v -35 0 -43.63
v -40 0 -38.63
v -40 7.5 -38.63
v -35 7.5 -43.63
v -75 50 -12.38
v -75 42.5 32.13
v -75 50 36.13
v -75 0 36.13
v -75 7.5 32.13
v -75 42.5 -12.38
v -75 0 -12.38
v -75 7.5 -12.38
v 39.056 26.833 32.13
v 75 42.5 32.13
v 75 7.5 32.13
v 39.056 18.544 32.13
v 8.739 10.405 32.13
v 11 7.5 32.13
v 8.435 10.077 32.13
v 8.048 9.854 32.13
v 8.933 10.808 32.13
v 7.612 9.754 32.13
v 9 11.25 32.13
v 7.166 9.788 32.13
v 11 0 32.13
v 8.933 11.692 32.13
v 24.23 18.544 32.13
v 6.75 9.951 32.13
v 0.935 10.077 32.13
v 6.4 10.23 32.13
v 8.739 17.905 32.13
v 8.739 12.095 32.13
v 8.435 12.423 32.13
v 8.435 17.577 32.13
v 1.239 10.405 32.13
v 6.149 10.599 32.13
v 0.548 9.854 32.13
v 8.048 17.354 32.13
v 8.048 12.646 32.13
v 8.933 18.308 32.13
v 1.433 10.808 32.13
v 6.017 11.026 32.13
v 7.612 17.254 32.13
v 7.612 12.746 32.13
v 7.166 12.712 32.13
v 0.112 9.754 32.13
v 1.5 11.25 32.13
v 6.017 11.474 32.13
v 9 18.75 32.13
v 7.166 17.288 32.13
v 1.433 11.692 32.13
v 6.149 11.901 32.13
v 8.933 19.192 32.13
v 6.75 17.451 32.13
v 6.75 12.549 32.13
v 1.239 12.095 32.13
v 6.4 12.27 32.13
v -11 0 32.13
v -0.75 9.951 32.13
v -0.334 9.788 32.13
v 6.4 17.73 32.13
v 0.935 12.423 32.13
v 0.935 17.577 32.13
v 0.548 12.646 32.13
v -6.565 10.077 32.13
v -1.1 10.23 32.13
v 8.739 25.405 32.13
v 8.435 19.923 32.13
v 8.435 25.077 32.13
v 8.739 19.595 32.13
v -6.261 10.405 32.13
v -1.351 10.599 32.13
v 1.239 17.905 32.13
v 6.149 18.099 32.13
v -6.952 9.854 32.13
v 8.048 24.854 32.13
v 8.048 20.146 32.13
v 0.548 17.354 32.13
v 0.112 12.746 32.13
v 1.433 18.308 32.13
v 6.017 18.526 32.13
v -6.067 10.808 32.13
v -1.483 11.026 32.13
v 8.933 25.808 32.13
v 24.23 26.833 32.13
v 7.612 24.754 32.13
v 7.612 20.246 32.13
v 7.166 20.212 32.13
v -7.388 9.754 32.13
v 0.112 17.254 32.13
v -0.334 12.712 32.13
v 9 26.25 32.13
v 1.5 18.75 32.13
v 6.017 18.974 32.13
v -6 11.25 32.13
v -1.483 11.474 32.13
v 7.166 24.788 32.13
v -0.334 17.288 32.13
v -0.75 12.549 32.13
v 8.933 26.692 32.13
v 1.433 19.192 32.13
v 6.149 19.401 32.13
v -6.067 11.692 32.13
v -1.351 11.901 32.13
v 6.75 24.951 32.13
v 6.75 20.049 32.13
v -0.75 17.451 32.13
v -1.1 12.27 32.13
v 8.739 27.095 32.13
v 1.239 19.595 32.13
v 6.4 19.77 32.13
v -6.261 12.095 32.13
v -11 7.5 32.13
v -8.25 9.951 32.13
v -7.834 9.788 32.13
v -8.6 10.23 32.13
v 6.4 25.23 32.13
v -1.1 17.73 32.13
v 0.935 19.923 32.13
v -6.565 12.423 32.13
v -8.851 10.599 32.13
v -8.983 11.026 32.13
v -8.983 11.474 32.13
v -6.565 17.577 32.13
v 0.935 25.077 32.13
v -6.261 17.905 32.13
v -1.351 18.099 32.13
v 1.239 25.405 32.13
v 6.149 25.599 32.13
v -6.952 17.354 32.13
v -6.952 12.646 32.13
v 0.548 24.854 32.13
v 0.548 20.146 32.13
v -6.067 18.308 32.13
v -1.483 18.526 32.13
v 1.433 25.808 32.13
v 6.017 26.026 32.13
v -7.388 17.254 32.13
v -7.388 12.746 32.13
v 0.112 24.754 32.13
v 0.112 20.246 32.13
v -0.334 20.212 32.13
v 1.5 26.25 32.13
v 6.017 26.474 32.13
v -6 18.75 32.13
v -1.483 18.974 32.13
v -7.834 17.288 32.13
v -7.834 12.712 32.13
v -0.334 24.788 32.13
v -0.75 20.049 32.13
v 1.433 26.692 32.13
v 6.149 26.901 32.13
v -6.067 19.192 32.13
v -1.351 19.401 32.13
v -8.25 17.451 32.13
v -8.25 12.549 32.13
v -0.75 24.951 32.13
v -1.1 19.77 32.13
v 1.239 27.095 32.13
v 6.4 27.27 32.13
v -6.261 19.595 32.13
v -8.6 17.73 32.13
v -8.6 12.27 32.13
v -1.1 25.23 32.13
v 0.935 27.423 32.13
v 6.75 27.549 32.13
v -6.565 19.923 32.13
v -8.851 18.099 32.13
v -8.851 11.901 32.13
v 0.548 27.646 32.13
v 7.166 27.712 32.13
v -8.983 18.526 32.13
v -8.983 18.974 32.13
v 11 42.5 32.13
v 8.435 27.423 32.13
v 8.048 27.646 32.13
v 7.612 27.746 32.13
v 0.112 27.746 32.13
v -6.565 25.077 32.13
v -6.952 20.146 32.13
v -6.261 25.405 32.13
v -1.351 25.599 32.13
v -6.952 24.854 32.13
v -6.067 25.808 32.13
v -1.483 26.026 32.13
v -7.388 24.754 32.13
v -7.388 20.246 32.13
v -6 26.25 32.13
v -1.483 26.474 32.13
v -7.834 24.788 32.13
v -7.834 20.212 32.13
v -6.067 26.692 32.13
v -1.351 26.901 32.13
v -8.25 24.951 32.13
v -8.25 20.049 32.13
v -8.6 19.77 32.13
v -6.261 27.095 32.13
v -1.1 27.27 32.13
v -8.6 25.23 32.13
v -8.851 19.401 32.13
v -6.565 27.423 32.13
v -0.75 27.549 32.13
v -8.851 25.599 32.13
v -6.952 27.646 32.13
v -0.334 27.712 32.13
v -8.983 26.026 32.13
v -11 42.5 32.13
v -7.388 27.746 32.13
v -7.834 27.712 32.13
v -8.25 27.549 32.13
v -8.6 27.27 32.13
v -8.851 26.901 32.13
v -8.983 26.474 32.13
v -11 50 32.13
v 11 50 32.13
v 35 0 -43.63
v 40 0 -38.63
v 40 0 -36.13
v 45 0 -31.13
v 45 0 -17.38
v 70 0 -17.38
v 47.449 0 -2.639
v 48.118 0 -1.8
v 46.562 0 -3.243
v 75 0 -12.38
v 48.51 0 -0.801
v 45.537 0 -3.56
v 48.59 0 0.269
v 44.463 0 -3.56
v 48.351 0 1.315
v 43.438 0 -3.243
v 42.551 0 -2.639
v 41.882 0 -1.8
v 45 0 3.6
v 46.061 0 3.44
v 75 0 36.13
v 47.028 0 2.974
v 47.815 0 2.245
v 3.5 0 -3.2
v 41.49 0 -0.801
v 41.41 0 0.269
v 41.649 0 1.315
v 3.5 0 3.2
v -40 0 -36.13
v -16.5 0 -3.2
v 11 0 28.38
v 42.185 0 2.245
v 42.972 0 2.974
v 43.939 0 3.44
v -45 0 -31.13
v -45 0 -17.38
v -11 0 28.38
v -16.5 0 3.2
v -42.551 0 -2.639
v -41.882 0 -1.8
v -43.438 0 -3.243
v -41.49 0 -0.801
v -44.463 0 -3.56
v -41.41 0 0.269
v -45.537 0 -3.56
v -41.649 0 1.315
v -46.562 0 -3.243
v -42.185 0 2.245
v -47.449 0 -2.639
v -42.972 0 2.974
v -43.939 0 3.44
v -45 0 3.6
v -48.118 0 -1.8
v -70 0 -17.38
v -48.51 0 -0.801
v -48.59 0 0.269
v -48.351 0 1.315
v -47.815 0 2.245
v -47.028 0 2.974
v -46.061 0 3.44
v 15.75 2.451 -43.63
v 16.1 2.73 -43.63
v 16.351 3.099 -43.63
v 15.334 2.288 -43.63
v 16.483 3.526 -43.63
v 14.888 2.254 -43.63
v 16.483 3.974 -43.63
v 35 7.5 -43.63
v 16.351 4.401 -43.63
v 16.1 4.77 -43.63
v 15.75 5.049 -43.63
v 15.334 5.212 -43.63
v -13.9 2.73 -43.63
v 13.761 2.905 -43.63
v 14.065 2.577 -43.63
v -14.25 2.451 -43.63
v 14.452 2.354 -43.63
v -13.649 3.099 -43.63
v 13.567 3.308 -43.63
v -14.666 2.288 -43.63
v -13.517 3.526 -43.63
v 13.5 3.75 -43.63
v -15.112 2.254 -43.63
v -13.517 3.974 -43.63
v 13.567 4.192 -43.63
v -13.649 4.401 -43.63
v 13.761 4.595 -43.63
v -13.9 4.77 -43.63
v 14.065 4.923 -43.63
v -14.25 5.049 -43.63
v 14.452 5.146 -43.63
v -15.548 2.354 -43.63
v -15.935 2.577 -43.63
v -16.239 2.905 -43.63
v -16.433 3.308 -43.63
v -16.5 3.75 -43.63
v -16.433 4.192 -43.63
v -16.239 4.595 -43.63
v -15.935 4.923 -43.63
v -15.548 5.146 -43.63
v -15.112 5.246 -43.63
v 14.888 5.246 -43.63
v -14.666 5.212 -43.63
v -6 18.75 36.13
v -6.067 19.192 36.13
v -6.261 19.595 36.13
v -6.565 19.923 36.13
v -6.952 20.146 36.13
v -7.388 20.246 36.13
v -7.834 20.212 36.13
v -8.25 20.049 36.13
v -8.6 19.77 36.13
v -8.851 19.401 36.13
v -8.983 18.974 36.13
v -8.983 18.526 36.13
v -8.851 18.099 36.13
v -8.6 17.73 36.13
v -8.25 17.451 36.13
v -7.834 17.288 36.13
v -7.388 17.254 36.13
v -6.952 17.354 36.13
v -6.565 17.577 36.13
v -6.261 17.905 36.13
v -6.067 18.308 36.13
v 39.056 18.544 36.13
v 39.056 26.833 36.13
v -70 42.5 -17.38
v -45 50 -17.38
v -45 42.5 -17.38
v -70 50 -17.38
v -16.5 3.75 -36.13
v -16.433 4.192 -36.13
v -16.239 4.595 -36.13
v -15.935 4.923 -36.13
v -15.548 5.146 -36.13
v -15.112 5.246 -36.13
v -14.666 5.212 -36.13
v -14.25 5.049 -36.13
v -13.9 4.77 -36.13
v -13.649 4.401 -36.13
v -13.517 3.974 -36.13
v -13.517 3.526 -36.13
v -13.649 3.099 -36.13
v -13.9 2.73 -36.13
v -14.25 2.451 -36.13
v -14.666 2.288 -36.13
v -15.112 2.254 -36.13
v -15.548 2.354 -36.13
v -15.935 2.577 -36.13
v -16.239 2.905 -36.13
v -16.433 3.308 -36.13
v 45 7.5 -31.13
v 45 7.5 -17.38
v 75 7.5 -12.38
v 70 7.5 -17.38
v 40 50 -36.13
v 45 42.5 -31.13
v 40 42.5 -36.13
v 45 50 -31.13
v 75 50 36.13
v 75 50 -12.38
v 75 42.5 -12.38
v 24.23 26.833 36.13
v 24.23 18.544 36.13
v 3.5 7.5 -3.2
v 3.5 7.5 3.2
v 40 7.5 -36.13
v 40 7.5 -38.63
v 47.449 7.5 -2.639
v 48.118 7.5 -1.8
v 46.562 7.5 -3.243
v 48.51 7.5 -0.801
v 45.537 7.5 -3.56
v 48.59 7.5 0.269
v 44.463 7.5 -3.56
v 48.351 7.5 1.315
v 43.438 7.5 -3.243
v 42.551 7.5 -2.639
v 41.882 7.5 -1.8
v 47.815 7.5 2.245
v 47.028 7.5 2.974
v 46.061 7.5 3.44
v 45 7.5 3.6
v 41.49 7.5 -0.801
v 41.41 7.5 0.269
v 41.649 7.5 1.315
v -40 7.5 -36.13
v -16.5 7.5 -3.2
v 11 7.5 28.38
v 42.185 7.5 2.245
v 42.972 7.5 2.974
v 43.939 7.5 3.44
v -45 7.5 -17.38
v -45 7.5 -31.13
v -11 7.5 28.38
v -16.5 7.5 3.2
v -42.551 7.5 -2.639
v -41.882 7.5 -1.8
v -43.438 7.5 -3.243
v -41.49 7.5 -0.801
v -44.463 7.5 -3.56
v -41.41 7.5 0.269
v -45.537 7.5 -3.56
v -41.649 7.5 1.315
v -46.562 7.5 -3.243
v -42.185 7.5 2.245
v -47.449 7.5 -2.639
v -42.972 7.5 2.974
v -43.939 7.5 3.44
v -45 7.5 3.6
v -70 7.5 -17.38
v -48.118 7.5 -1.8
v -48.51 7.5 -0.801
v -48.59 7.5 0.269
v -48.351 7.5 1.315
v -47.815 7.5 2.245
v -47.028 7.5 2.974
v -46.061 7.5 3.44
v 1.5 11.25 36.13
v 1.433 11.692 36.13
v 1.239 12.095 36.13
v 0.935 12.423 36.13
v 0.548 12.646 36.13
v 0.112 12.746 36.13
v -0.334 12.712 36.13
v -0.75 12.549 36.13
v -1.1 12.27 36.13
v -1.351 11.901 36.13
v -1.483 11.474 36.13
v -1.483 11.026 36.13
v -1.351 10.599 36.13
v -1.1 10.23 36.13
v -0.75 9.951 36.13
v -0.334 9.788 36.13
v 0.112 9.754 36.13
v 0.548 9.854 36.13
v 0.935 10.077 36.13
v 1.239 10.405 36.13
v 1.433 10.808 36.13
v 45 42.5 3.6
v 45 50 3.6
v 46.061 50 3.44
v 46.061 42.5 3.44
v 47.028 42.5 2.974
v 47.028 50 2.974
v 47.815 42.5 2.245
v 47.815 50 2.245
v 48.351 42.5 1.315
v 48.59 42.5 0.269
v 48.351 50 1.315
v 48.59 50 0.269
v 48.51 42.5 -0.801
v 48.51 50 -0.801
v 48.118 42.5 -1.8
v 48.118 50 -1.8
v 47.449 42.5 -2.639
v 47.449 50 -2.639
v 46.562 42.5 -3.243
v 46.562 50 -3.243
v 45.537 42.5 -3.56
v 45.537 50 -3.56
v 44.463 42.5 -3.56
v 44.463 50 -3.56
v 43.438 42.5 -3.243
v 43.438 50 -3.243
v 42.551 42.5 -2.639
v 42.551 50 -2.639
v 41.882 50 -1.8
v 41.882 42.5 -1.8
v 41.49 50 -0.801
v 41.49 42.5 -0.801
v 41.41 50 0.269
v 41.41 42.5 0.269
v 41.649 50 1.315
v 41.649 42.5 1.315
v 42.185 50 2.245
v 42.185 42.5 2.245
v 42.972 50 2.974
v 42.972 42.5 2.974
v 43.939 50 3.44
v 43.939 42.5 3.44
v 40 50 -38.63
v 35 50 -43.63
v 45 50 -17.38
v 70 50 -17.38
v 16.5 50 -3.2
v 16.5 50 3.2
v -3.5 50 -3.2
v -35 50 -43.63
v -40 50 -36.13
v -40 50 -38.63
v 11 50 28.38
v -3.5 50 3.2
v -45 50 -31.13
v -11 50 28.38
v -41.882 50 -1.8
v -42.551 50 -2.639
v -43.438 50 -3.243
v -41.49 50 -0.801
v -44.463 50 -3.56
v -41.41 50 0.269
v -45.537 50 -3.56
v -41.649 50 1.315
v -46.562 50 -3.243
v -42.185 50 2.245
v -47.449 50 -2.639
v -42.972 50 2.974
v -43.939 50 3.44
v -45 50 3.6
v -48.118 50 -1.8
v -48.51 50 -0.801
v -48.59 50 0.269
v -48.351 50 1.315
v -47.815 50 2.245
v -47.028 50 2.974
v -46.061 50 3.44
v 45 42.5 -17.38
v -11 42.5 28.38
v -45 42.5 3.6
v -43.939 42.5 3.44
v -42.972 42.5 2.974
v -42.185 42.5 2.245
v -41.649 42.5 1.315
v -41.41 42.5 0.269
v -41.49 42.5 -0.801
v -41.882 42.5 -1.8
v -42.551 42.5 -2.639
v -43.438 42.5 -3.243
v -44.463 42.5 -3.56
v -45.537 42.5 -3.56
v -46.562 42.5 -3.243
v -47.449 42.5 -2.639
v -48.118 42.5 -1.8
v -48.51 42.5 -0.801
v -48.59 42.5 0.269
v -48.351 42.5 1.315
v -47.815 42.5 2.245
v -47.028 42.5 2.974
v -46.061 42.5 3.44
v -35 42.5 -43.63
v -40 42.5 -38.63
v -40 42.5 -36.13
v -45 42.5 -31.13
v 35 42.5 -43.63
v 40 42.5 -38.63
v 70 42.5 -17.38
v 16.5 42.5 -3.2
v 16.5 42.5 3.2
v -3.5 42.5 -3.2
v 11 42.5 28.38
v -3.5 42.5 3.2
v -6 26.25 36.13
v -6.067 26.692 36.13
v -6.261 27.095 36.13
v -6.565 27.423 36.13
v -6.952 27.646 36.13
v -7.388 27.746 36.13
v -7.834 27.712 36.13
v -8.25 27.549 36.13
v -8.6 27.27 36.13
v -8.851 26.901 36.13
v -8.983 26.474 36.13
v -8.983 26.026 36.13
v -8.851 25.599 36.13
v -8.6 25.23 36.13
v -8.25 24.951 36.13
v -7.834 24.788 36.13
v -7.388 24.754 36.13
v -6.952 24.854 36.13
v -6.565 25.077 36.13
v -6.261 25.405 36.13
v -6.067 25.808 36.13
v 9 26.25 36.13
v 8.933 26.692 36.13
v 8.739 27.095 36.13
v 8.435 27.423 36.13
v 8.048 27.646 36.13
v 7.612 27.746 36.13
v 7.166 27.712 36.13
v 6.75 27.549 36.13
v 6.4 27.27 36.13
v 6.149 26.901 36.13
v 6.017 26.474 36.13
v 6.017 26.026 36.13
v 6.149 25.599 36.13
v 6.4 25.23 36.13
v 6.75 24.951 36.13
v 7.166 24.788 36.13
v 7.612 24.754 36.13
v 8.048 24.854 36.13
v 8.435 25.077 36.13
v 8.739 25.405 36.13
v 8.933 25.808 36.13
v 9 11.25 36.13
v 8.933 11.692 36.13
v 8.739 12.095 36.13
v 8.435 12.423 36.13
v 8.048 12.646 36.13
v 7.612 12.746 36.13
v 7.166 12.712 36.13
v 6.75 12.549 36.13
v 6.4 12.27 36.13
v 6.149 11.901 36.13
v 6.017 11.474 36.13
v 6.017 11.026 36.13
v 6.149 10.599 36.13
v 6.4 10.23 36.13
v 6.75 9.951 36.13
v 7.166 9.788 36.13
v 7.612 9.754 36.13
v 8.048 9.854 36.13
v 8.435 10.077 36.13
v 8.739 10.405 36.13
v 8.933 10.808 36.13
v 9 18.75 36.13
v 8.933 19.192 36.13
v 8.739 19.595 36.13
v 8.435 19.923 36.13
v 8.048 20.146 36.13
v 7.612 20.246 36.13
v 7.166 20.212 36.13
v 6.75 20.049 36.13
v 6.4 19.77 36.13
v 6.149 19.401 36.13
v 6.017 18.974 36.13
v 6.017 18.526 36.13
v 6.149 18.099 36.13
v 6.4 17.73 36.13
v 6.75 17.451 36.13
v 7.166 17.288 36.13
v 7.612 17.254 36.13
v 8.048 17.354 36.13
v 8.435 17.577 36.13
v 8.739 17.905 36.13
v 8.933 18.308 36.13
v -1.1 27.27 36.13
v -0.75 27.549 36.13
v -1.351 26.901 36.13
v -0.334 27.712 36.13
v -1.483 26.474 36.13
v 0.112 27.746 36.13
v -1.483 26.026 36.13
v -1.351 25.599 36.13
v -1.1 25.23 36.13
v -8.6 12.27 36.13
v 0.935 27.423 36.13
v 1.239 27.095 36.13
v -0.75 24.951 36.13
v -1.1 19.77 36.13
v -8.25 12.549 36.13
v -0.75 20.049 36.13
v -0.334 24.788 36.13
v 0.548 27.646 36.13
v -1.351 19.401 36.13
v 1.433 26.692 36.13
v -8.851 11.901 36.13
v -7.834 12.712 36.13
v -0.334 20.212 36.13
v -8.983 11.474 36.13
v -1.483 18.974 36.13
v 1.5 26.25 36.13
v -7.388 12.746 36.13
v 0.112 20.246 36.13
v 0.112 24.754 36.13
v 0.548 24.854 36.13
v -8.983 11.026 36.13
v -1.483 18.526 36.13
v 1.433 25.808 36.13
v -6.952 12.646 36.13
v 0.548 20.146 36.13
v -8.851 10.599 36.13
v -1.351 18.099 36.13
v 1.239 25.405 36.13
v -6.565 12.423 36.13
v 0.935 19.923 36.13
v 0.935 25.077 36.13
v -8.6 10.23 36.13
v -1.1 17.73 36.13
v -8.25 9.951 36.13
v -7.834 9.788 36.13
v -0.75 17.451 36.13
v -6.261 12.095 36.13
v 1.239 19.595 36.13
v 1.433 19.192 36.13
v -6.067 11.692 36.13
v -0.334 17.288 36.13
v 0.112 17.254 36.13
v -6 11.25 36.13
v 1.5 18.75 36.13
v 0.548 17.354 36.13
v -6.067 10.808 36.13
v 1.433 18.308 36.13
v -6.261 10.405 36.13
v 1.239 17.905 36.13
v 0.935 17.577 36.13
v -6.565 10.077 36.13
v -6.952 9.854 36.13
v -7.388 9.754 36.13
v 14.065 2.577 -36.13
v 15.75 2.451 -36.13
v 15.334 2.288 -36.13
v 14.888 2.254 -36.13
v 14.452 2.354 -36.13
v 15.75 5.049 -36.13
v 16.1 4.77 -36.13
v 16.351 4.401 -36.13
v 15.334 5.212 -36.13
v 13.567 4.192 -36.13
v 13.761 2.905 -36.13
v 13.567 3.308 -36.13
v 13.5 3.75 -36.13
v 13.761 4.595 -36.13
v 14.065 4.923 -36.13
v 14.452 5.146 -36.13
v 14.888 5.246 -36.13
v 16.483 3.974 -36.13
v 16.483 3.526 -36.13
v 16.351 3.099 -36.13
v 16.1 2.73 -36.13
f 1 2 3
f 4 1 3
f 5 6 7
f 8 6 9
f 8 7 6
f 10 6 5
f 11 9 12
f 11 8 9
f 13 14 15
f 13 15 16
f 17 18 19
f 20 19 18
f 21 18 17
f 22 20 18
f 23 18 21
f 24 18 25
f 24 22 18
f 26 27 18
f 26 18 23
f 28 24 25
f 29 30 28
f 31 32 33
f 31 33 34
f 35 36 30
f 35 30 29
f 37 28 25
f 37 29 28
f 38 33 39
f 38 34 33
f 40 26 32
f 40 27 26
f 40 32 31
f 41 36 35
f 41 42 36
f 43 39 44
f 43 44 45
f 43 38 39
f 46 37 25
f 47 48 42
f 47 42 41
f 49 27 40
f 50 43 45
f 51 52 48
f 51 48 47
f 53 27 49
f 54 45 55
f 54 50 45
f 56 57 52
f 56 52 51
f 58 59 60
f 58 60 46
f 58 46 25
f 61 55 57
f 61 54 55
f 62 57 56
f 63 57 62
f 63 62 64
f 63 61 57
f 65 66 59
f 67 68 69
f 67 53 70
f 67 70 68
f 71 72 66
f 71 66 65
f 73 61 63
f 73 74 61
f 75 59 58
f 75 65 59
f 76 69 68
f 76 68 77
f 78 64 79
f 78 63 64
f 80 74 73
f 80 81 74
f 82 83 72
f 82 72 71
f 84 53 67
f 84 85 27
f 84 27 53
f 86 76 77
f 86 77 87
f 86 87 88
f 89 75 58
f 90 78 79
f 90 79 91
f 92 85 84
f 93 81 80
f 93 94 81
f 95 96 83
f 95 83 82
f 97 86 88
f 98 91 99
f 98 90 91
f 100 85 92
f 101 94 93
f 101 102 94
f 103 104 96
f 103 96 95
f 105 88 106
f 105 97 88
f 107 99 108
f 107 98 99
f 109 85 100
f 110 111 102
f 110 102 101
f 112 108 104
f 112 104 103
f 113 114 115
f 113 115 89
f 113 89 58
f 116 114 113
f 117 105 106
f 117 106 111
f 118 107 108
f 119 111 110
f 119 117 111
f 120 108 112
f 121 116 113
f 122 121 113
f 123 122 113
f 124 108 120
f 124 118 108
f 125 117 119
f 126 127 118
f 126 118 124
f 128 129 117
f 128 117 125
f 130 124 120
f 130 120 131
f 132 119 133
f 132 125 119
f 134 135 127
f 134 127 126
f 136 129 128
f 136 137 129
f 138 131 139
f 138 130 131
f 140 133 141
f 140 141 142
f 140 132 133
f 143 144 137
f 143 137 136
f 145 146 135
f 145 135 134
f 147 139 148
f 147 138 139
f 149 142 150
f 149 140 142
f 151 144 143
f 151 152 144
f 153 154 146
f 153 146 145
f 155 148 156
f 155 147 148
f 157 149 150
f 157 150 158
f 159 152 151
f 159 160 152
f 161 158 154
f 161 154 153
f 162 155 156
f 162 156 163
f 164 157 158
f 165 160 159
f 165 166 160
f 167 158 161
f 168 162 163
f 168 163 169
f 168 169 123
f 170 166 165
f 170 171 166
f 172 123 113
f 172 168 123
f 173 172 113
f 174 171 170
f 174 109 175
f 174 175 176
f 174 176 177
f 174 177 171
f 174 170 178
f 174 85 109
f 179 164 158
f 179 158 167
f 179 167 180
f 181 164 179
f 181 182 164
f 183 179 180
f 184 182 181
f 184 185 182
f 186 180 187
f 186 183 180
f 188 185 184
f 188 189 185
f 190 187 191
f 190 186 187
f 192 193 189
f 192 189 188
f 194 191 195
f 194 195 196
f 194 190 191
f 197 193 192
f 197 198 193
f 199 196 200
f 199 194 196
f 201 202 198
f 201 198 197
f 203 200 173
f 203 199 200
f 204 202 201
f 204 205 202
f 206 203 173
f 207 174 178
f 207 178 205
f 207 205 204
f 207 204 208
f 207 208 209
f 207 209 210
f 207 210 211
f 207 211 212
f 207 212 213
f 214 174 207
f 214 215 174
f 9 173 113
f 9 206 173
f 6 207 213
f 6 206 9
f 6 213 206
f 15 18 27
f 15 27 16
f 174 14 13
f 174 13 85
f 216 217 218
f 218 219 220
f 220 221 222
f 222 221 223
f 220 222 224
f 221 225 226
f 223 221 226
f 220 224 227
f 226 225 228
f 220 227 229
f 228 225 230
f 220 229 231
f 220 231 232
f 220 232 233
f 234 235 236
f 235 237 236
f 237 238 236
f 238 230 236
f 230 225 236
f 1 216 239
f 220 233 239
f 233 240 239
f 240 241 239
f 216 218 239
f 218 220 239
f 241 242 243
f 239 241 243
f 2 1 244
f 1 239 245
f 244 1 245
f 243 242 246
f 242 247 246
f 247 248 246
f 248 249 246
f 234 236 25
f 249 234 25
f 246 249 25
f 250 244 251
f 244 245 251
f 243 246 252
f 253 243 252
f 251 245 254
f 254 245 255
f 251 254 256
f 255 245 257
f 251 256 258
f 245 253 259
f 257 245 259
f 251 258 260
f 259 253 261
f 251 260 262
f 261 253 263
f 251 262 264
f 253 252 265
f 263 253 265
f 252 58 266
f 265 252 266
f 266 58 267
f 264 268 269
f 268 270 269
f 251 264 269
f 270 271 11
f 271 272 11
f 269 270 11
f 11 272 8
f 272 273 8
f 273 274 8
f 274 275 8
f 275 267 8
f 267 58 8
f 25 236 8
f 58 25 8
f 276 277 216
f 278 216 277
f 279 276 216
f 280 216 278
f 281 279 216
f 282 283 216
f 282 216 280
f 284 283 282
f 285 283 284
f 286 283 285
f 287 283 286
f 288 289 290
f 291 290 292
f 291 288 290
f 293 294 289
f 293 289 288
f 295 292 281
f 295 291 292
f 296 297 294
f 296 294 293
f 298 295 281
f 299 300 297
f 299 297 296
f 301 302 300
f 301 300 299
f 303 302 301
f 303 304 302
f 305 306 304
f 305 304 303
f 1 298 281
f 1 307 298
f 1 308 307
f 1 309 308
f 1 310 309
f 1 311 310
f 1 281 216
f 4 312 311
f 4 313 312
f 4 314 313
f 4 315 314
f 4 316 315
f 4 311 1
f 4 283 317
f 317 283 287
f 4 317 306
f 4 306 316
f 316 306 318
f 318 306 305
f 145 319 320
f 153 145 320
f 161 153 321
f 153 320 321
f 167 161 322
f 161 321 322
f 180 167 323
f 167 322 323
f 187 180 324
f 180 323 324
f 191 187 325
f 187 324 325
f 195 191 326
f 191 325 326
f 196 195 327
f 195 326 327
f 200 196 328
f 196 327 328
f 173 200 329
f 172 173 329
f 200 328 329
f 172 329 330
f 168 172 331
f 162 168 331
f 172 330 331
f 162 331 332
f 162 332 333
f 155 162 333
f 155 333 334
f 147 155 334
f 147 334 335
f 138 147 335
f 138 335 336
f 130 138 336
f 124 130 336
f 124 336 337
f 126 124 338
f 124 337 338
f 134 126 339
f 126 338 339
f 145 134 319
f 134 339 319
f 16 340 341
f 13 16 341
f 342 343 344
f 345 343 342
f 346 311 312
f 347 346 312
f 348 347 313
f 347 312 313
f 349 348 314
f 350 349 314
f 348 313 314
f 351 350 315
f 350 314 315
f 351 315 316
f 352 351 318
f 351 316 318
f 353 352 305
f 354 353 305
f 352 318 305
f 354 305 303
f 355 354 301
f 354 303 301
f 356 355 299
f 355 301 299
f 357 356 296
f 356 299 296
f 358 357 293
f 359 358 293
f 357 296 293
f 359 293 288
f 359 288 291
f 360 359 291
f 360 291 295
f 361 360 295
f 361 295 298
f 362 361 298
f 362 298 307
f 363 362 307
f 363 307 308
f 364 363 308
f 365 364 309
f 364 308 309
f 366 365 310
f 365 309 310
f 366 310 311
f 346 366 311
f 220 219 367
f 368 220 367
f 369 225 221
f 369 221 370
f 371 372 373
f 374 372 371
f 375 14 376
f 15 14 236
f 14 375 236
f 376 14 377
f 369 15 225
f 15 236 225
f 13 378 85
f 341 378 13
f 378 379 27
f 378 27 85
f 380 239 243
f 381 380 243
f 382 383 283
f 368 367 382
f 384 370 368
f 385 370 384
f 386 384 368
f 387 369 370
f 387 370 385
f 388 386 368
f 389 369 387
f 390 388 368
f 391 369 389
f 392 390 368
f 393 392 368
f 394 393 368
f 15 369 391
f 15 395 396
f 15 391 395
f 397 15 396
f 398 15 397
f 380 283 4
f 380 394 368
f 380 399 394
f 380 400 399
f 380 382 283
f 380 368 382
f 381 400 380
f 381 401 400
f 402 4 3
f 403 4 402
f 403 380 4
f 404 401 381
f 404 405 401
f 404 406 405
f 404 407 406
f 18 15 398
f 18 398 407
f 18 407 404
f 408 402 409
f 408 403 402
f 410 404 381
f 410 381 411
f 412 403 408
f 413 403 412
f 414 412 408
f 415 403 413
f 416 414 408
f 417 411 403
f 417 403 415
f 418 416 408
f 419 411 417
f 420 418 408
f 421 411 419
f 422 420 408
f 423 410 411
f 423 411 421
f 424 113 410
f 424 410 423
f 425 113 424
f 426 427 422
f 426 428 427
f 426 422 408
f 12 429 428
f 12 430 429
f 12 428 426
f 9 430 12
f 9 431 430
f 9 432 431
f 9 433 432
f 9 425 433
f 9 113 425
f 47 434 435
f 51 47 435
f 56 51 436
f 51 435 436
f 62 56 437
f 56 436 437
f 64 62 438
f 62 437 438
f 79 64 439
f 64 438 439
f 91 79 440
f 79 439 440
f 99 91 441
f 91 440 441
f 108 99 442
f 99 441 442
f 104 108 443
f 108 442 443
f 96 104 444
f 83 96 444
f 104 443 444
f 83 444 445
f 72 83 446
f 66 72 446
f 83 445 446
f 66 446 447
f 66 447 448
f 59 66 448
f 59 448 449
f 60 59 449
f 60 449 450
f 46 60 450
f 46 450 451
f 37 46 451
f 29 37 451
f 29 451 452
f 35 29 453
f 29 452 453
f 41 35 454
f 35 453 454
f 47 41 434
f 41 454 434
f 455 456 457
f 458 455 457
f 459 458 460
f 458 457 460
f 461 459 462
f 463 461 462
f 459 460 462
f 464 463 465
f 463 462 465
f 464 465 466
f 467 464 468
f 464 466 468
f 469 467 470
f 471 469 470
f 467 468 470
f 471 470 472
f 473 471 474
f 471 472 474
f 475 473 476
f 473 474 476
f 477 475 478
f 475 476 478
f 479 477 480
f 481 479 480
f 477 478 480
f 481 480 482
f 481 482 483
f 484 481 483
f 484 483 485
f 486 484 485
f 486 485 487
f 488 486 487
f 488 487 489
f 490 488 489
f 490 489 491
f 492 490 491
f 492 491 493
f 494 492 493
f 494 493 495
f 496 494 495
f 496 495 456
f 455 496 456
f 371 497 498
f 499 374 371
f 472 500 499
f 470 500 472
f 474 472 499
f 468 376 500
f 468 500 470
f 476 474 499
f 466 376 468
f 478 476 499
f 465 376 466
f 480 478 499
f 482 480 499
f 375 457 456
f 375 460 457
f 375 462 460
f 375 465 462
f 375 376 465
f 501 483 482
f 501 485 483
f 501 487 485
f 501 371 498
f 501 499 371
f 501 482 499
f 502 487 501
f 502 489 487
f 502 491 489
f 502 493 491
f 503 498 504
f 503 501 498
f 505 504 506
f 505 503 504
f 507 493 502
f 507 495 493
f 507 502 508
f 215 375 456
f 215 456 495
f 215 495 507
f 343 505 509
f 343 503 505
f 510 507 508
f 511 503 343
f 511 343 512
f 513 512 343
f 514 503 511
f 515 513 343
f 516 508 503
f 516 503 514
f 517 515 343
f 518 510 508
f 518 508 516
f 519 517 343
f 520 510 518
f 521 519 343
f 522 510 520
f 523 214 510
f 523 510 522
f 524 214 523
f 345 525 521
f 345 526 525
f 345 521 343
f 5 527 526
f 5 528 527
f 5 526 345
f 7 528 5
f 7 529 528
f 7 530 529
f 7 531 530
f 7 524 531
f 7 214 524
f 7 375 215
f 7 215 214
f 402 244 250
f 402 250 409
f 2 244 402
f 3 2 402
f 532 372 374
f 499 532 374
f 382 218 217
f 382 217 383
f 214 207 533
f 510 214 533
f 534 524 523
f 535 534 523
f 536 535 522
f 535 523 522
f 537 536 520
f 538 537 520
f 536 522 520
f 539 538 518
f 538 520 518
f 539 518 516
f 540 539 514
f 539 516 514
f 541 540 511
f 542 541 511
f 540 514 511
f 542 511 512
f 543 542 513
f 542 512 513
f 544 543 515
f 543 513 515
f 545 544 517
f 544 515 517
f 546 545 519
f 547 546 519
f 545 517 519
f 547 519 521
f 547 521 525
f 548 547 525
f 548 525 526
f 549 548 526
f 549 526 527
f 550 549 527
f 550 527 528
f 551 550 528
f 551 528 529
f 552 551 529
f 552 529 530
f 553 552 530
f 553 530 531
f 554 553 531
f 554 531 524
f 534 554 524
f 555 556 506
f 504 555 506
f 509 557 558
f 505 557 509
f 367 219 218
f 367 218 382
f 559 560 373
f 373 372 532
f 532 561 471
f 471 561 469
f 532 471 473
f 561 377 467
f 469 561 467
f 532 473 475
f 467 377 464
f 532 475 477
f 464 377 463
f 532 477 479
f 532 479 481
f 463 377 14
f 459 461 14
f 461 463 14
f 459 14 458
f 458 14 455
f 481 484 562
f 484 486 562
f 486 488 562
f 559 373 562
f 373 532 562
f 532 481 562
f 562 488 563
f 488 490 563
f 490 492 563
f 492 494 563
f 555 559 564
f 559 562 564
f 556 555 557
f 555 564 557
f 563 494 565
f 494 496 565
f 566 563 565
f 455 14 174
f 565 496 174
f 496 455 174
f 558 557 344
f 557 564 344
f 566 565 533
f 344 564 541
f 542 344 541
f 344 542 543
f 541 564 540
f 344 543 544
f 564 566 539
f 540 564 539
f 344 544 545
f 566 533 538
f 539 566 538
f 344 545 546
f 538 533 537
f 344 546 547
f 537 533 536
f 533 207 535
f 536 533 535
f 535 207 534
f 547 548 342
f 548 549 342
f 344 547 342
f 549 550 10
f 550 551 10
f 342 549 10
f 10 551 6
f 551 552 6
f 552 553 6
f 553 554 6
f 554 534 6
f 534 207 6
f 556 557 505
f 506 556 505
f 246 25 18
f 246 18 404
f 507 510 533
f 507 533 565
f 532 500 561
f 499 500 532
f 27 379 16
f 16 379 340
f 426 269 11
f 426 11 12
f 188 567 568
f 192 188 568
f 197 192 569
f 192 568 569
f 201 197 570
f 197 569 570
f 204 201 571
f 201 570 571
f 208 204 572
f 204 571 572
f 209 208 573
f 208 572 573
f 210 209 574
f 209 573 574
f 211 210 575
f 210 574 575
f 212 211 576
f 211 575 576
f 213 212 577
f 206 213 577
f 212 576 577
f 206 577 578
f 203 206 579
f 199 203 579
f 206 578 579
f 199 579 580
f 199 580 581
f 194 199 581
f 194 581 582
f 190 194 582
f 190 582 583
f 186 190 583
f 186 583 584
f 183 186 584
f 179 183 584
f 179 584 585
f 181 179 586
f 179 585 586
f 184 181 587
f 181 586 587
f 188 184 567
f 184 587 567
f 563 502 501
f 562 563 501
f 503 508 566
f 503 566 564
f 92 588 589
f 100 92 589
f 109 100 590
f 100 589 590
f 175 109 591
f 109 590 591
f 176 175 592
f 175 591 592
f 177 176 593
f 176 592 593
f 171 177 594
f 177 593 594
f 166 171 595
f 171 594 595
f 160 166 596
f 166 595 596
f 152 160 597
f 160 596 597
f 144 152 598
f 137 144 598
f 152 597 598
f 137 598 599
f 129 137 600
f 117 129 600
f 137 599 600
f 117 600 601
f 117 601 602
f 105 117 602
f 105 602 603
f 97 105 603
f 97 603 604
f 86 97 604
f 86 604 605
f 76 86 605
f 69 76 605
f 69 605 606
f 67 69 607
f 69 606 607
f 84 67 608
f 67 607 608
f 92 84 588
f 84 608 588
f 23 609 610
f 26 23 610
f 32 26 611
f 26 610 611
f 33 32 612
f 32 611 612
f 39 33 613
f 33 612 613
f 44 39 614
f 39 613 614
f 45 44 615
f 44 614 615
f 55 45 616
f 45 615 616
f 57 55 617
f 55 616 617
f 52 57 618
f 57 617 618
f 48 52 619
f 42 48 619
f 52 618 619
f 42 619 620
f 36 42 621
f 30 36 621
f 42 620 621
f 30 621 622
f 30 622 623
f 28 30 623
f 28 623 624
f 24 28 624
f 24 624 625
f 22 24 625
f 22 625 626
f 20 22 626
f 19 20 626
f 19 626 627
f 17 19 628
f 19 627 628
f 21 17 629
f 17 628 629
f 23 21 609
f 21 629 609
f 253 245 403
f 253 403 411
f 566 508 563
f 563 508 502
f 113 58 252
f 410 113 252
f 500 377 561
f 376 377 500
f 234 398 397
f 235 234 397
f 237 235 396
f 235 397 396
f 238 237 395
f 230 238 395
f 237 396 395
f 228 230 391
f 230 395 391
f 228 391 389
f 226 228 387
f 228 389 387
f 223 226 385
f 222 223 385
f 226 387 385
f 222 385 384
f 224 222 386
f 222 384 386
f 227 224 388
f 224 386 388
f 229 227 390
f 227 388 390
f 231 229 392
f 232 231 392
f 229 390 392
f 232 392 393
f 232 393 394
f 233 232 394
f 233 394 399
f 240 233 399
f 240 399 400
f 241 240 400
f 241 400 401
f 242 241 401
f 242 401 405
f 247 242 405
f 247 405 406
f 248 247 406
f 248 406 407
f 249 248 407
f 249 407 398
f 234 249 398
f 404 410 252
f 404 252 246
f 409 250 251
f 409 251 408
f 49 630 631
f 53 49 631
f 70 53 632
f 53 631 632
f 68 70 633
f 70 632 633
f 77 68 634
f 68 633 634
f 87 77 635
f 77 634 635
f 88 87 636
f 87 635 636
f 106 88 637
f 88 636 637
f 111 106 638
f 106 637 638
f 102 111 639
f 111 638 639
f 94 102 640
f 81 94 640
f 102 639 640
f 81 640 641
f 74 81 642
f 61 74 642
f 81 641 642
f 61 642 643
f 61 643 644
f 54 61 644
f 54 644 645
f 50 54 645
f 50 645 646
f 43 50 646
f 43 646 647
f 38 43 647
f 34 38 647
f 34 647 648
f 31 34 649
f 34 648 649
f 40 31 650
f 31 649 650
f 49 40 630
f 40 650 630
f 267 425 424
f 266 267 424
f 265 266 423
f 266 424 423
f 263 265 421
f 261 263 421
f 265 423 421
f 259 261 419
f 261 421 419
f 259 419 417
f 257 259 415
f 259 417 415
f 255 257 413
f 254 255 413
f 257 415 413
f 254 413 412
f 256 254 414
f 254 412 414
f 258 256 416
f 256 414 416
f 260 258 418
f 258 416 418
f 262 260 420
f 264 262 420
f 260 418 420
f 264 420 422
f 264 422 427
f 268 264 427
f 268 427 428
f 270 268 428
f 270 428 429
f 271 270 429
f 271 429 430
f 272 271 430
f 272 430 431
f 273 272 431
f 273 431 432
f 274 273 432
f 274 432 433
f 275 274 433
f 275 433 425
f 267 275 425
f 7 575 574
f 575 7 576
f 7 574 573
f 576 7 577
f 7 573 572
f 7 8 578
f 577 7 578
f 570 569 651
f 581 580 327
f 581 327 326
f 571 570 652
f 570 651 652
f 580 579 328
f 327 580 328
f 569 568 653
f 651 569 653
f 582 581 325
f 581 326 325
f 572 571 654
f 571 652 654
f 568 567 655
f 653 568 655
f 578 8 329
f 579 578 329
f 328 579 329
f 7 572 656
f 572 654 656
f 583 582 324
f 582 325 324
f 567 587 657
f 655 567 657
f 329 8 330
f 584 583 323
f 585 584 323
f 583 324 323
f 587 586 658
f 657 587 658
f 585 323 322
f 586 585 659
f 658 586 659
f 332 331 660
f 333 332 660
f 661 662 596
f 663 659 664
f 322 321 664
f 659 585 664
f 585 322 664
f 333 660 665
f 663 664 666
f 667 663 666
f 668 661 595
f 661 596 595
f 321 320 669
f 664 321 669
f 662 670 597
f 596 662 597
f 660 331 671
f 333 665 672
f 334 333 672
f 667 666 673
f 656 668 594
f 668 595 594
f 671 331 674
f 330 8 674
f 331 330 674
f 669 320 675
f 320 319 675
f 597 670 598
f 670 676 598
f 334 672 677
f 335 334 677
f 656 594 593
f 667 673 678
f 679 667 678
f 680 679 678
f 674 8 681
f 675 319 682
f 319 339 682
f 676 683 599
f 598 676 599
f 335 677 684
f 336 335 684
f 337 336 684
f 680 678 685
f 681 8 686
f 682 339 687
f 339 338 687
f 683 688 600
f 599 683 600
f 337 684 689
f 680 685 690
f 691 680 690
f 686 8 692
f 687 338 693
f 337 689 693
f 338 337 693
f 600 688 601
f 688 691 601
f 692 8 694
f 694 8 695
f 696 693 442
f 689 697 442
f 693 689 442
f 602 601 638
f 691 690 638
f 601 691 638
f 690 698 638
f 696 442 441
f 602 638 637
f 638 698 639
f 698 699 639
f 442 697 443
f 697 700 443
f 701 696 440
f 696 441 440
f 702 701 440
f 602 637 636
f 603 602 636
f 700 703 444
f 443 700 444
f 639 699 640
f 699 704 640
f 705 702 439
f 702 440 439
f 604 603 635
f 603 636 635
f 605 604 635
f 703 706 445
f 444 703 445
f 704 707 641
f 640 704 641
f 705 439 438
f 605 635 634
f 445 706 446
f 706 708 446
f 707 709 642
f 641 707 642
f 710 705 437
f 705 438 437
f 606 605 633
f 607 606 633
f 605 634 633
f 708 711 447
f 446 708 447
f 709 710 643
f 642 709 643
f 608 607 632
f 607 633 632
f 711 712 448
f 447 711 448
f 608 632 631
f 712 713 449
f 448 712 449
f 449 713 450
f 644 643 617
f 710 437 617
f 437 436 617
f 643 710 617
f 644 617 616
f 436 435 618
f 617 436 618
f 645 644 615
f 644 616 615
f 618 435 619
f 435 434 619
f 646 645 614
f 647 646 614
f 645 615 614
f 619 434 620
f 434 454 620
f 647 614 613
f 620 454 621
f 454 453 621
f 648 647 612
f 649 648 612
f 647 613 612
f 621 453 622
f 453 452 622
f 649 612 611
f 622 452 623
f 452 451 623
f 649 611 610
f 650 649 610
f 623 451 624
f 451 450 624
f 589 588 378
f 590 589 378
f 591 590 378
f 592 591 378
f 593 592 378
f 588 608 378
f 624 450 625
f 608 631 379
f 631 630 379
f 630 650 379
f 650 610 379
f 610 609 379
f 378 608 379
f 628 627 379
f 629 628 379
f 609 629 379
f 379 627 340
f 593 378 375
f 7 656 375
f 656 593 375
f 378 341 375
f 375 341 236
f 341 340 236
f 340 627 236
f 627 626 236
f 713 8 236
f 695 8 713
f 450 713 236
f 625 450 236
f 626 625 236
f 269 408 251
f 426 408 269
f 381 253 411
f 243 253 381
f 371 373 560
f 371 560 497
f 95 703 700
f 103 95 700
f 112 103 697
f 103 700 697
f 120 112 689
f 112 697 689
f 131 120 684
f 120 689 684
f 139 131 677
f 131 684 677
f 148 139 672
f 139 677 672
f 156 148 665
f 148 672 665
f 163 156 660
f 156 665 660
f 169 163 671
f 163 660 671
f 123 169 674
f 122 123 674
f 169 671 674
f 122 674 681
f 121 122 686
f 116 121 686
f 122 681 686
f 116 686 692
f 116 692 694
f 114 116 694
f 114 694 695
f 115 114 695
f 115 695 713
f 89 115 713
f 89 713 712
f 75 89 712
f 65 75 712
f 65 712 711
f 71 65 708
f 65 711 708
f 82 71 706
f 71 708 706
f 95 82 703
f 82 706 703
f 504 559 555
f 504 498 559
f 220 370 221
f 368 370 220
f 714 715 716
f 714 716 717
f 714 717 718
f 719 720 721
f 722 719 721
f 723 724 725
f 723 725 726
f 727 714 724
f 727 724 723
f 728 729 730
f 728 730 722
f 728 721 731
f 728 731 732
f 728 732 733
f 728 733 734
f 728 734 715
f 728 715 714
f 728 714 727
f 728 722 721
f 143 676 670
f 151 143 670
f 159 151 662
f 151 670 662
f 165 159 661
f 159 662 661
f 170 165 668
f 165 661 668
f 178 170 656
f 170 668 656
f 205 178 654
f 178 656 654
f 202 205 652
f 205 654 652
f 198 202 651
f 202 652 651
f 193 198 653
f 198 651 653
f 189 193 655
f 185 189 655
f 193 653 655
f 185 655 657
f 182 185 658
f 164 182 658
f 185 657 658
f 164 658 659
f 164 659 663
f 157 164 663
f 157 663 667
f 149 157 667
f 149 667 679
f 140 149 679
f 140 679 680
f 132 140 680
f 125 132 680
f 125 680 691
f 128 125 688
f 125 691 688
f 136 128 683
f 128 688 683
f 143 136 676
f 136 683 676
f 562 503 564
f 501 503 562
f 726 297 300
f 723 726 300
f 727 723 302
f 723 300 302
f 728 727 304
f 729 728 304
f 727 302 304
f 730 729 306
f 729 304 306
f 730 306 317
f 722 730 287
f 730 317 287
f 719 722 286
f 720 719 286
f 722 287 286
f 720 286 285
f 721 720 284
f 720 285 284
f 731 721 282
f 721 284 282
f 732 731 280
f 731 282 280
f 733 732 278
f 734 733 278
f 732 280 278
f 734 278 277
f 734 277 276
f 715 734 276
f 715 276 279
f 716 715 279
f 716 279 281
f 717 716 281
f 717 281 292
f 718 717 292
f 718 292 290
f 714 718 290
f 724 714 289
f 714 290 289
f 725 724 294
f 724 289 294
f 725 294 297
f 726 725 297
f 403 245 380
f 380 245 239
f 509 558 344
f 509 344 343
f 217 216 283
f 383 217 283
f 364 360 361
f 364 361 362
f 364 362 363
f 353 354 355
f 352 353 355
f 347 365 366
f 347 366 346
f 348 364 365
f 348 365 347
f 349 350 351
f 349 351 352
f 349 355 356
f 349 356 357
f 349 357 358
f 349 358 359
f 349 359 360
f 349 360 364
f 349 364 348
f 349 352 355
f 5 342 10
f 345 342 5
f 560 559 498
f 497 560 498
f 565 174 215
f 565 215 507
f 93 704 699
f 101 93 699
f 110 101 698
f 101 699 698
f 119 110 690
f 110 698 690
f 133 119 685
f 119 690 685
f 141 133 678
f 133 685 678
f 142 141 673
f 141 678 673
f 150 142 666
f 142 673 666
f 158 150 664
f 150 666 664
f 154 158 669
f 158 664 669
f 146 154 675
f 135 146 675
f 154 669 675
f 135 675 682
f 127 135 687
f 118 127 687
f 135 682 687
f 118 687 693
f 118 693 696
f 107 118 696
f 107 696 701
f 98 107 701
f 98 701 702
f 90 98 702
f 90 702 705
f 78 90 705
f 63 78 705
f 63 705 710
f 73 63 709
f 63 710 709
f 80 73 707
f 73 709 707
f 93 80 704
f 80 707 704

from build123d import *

# Parameters (mm, degrees)
SKETCH1_W           = 150
SKETCH1_H           = 72.26
BOSS_EXTRUDE1_DEPTH = 50
SKETCH2_R           = 3.6
CUT_EXTRUDE1_DEPTH  = 50
SKETCH3_W           = 30
SKETCH3_H           = 50
CUT_EXTRUDE2_DEPTH  = 18.75
CHAMFER1_SIZE       = 5
SKETCH4_W           = 80
SKETCH4_H           = 7.5
BOSS_EXTRUDE2_DEPTH = 7.5
CHAMFER2_SIZE       = 5
SKETCH5_W           = 150
SKETCH5_H           = 35
CUT_EXTRUDE3_DEPTH  = 68.26
SKETCH10_R          = 1.5
CUT_EXTRUDE4_DEPTH  = 4
SKETCH11_W          = 22
SKETCH11_H          = 3.75
CUT_EXTRUDE5_DEPTH  = 50
SKETCH13_W          = 80
SKETCH13_H          = 7.5
BOSS_EXTRUDE3_DEPTH = 7.5
SKETCH14_R          = 1.5
CUT_EXTRUDE6_DEPTH  = 7.5
CHAMFER3_SIZE       = 5
SKETCH19_W          = 20
SKETCH19_H          = 6.4
CUT_EXTRUDE10_DEPTH = 10
SKETCH20_W          = 14.825220809
SKETCH20_H          = 8.289370775
CUT_EXTRUDE11_DEPTH = 9
SKETCH21_W          = 20
SKETCH21_H          = 6.4
CUT_EXTRUDE12_DEPTH = 10


with BuildPart() as part:
    # Sketch1 → Boss-Extrude1 (new body)
    with BuildSketch(Plane(origin=(0, 0, 0), x_dir=(1, 0, 0), z_dir=(0, 1, 0))):
        Rectangle(SKETCH1_W, SKETCH1_H)
    extrude(amount=BOSS_EXTRUDE1_DEPTH)

    # Sketch2 → Cut-Extrude1 (cut)
    with BuildSketch(Plane(origin=(0, 50, 0), x_dir=(1, 0, 0), z_dir=(0, 1, 0))):
        with Locations(Location((-45, 0, 0), (0, 0, 270))):
            Circle(SKETCH2_R)
        with Locations(Location((45, 0, 0), (0, 0, 270))):
            Circle(SKETCH2_R)
    extrude(amount=-CUT_EXTRUDE1_DEPTH, mode=Mode.SUBTRACT)

    # Sketch3 → Cut-Extrude2 (cut)
    with BuildSketch(Plane(origin=(0, 0, -36.13), x_dir=(-1, 0, 0), z_dir=(0, 0, -1))):
        with Locations((60, 25)):
            Rectangle(SKETCH3_W, SKETCH3_H)
        with Locations((-60, 25)):
            Rectangle(SKETCH3_W, SKETCH3_H)
    extrude(amount=-CUT_EXTRUDE2_DEPTH, mode=Mode.SUBTRACT)

    # Chamfer1
    chamfer1_edges = [part.edges().sort_by_distance(p)[0] for p in [
        (-75, 25, -17.38),
        (-45, 25, -36.13),
        (75, 25, -17.38),
        (45, 25, -36.13),
    ]]
    chamfer(chamfer1_edges, length=CHAMFER1_SIZE)

    # Sketch4 → Boss-Extrude2 (add)
    with BuildSketch(Plane(origin=(0, 0, -36.13), x_dir=(-1, 0, 0), z_dir=(0, 0, -1))):
        with Locations((0, 46.25)):
            Rectangle(SKETCH4_W, SKETCH4_H)
    extrude(amount=BOSS_EXTRUDE2_DEPTH)

    # Chamfer2
    chamfer2_edges = [part.edges().sort_by_distance(p)[0] for p in [
        (40, 46.25, -43.63),
        (-40, 46.25, -43.63),
    ]]
    chamfer(chamfer2_edges, length=CHAMFER2_SIZE)

    # Sketch5 → Cut-Extrude3 (cut)
    with BuildSketch(Plane(origin=(0, 0, -36.13), x_dir=(-1, 0, 0), z_dir=(0, 0, -1))):
        with Locations((0, 25)):
            Rectangle(SKETCH5_W, SKETCH5_H)
    extrude(amount=-CUT_EXTRUDE3_DEPTH, mode=Mode.SUBTRACT)

    # Sketch10 → Cut-Extrude4 (cut)
    with BuildSketch(Plane.XY.offset(36.13)):
        with Locations((0, 26.25)):
            Circle(SKETCH10_R)
        with Locations((0, 18.75)):
            Circle(SKETCH10_R)
        with Locations((0, 11.25)):
            Circle(SKETCH10_R)
        with Locations((-7.5, 26.25)):
            Circle(SKETCH10_R)
        with Locations((-7.5, 18.75)):
            Circle(SKETCH10_R)
        with Locations((-7.5, 11.25)):
            Circle(SKETCH10_R)
        with Locations((7.5, 26.25)):
            Circle(SKETCH10_R)
        with Locations((7.5, 18.75)):
            Circle(SKETCH10_R)
        with Locations((7.5, 11.25)):
            Circle(SKETCH10_R)
    extrude(amount=-CUT_EXTRUDE4_DEPTH, mode=Mode.SUBTRACT)

    # Sketch11 → Cut-Extrude5 (cut)
    with BuildSketch(Plane(origin=(0, 50, 0), x_dir=(1, 0, 0), z_dir=(0, 1, 0))):
        with Locations((0, -30.255)):
            Rectangle(SKETCH11_W, SKETCH11_H)
    extrude(amount=-CUT_EXTRUDE5_DEPTH, mode=Mode.SUBTRACT)

    # Sketch13 → Boss-Extrude3 (add)
    with BuildSketch(Plane(origin=(0, 0, -36.13), x_dir=(-1, 0, 0), z_dir=(0, 0, -1))):
        with Locations((0, 3.75)):
            Rectangle(SKETCH13_W, SKETCH13_H)
    extrude(amount=BOSS_EXTRUDE3_DEPTH)

    # Sketch14 → Cut-Extrude6 (cut)
    with BuildSketch(Plane(origin=(0, 0, -43.63), x_dir=(-1, 0, 0), z_dir=(0, 0, -1))):
        with Locations((-15, 3.75)):
            Circle(SKETCH14_R)
        with Locations((15, 3.75)):
            Circle(SKETCH14_R)
    extrude(amount=-CUT_EXTRUDE6_DEPTH, mode=Mode.SUBTRACT)

    # Chamfer3
    chamfer3_edges = [part.edges().sort_by_distance(p)[0] for p in [
        (40, 3.75, -43.63),
        (-40, 3.75, -43.63),
    ]]
    chamfer(chamfer3_edges, length=CHAMFER3_SIZE)

    # Sketch19 → Cut-Extrude10 (cut)
    with BuildSketch(Plane(origin=(0, 50, 0), x_dir=(1, 0, 0), z_dir=(0, 1, 0))):
        with Locations((6.5, 0)):
            Rectangle(SKETCH19_W, SKETCH19_H)
    extrude(amount=-CUT_EXTRUDE10_DEPTH, mode=Mode.SUBTRACT)

    # Sketch20 → Cut-Extrude11 (cut)
    with BuildSketch(Plane.XY.offset(36.13)):
        with Locations((31.643078824, 22.688540842)):
            Rectangle(SKETCH20_W, SKETCH20_H)
    extrude(amount=-CUT_EXTRUDE11_DEPTH, mode=Mode.SUBTRACT)

    # Sketch21 → Cut-Extrude12 (cut)
    with BuildSketch(Plane.XZ):
        with Locations((-6.5, 0)):
            Rectangle(SKETCH21_W, SKETCH21_H)
    extrude(amount=-CUT_EXTRUDE12_DEPTH, mode=Mode.SUBTRACT)


solid = part.part
